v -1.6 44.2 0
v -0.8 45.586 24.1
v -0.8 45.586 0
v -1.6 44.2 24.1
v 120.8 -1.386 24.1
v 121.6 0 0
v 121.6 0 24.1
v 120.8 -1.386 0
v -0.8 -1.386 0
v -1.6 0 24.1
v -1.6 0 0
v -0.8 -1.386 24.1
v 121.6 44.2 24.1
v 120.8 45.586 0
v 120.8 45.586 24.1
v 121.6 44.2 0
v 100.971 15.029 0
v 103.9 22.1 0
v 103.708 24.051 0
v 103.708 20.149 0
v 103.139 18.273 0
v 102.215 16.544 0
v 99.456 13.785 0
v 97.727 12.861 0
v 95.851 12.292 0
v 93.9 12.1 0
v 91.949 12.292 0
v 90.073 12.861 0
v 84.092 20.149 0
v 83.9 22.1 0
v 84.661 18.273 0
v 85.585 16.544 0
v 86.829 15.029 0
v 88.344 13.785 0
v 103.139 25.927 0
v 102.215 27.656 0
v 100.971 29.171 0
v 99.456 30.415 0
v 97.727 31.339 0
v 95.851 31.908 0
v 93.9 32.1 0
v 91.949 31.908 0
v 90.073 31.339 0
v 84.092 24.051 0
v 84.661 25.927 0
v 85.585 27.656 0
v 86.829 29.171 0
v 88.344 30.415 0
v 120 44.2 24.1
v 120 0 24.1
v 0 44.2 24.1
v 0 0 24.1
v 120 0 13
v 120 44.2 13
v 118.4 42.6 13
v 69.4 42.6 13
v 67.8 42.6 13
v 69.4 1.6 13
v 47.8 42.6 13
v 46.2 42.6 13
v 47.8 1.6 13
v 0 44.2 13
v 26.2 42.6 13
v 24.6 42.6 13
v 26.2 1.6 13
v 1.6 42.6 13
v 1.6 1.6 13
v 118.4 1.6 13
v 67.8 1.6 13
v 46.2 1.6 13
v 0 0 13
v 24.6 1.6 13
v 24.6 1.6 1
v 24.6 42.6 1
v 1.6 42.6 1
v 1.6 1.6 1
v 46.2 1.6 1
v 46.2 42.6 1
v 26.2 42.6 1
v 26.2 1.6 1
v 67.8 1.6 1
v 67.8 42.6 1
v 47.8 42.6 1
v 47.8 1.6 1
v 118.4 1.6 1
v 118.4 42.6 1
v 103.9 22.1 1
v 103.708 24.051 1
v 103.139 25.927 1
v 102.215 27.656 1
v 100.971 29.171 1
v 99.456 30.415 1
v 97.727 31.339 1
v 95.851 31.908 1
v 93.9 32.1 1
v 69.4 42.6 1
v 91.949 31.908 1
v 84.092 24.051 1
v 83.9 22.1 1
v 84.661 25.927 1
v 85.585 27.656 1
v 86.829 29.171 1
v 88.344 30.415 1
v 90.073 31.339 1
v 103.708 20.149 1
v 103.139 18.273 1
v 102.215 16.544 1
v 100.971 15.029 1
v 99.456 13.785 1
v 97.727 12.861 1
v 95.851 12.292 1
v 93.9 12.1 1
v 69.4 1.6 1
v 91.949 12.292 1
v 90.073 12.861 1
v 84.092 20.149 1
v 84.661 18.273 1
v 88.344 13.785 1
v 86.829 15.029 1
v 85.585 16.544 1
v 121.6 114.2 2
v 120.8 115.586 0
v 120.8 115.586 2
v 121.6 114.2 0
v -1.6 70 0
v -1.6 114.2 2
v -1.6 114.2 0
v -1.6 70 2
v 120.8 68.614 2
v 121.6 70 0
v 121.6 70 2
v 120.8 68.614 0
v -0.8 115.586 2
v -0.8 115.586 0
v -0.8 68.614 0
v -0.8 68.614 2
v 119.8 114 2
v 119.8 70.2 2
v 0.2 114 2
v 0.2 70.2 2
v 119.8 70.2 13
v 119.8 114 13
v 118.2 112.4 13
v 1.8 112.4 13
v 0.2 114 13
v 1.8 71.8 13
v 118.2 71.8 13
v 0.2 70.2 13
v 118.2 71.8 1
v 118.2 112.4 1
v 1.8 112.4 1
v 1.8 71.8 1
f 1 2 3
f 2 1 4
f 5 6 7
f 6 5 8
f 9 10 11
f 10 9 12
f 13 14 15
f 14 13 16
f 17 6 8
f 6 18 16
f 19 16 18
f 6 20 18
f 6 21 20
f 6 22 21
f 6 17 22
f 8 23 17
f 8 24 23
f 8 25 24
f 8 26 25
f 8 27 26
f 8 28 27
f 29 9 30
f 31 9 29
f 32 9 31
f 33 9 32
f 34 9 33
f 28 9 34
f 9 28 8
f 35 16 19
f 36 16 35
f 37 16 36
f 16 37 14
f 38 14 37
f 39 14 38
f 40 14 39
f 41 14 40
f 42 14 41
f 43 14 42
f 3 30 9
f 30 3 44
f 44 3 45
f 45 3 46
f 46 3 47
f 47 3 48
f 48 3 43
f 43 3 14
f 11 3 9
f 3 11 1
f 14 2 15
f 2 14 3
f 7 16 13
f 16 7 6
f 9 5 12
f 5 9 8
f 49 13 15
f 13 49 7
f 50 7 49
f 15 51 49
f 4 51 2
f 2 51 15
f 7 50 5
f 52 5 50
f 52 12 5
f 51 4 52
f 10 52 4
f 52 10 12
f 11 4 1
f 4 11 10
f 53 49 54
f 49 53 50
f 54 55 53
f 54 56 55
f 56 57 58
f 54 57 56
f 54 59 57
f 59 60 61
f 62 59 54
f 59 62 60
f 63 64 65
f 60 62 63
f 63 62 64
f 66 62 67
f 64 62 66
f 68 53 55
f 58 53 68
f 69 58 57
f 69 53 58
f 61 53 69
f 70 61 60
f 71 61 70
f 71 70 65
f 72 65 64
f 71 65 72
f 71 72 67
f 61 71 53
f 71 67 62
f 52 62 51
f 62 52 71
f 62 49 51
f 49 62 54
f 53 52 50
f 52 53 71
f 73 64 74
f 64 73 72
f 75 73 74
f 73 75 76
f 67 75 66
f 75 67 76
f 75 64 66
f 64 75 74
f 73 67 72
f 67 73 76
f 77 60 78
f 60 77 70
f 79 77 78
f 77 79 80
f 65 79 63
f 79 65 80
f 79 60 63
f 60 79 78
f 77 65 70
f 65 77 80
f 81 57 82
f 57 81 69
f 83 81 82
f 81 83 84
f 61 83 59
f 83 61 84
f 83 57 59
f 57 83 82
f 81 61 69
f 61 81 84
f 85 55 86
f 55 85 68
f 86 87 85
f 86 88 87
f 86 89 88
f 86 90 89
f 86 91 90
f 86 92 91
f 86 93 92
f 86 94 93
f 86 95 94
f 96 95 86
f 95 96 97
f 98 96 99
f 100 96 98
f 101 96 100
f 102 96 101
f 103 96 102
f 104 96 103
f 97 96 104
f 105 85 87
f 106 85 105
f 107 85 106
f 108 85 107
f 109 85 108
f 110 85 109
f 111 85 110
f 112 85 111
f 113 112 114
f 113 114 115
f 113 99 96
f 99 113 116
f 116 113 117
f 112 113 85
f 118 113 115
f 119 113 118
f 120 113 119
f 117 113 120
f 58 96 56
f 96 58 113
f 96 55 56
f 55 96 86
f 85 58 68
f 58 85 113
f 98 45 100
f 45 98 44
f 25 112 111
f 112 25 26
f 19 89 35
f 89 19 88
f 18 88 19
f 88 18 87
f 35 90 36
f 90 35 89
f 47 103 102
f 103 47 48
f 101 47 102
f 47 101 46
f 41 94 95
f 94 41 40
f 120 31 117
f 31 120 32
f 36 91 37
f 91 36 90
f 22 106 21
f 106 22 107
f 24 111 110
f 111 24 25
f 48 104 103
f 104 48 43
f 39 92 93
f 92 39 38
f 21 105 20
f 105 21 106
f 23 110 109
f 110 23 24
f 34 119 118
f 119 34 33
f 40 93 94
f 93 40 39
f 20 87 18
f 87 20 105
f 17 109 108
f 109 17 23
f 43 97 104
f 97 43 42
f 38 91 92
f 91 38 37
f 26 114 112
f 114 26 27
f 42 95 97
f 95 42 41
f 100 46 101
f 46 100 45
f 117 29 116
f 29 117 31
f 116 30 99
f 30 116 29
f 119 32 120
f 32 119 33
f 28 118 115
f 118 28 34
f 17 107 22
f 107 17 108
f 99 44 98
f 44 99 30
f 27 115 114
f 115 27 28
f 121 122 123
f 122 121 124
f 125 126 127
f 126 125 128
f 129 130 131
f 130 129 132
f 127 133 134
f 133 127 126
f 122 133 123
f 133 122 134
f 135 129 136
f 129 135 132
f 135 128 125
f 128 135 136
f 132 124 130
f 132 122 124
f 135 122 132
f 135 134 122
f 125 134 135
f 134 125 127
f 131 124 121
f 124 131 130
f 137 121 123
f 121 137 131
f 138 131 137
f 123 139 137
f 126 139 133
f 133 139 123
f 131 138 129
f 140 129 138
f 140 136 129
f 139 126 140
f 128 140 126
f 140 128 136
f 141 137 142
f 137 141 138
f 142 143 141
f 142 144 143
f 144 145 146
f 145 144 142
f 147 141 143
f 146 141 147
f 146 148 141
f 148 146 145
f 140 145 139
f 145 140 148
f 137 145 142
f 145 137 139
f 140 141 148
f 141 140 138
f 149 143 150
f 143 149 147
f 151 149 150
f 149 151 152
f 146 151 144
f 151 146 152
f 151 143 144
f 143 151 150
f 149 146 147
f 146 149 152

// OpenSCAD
// Puerto Rico Anniversary Edition
//
// by W. Craig Trader is dual-licensed under 
// Creative Commons Attribution-ShareAlike 3.0 Unported License and
// GNU Lesser GPL 3.0 or later.

include <MCAD/units.scad>;

// Physical dimensions
WALL = 0.8 * mm; // Slicing filament thickness
GAP  = 0.2 * mm; // Size differential between box and lid, for snug fit
POKE_HOLE = 20 * mm; // Diameter of poke holes in bottom
BOTTOM = 1 * mm;

// Tile dimensions
BASIC_THICKNESS = 7/128 * inch;
DELUXE_THICKNESS = 1/8 * inch;
TILE_WIDTH = (1 + 37/64) * inch;
SMALL_TILE_HEIGHT = 29/32 * inch;
LARGE_TILE_HEIGHT = (1 + 57/64) * inch;

// Wall dimensions
OUTER  = 2 * WALL;
INNER  = 2 * WALL;
SEP    = 2 * WALL;

OVERLAP = 0.1 * mm; // Ensures that there are no vertical artifacts leftover

$fa=4;

module basic_bottom() {
    box_height = ceil( max( SMALL_TILE_HEIGHT/2, 5*BASIC_THICKNESS) );
    lid_height = ceil( SMALL_TILE_HEIGHT ) - box_height;

    s1 = ceil( 16*BASIC_THICKNESS );
    s2 = ceil( 14*BASIC_THICKNESS );
    s3 = ceil( 14*BASIC_THICKNESS );
    s4 = ceil( LARGE_TILE_HEIGHT );

    width = ceil( TILE_WIDTH );
    length = 2*INNER + 3*SEP + s1 + s2 + s3 + s4;
    height = 2*INNER + width;

    echo( Width=width, BasicS1=s1, BasicS2=s2, BasicS3=s3, BasicS4=s4 );
    echo( BasicInsideLength=length, BasicInsideHeight=height );
    echo( BasicOutsideLength=length+2*OUTER, BasicOutsideHeight=height+2*OUTER );

    difference() {
        // Outside of box
        minkowski() {
            cube( [ length, height, box_height+lid_height ] );
            cylinder( r=OUTER, h=OVERLAP );
        }
        
        // Remove upper lip
        translate( [ 0, 0, BOTTOM+box_height ] ) 
            cube( [ length, height, lid_height+OVERLAP ] );
        
        // Remove space for tiles
        translate( [ INNER, INNER, BOTTOM ] ) 
            cube( [ s1, width, box_height+OVERLAP ] );
        translate( [ INNER+s1+SEP, INNER, BOTTOM ] ) 
            cube( [ s2, width, box_height+OVERLAP ] );
        translate( [ INNER+s1+s2+2*SEP, INNER, BOTTOM ] ) 
            cube( [ s3, width, box_height+OVERLAP ] );
        translate( [ INNER+s1+s2+s3+3*SEP, INNER, BOTTOM ] ) 
            cube( [ s4, width, box_height+OVERLAP ] );

        // Remove holes in bottom, for ease in removing tiles and parts
        translate( [ INNER+s1+s2+s3+3*SEP+s4/2, INNER+width/2, -OVERLAP ] ) 
            cylinder( d=POKE_HOLE, h=BOTTOM+2*OVERLAP );
    }
}

module basic_top() {
    box_height = ceil( max( SMALL_TILE_HEIGHT/2, 5*BASIC_THICKNESS) );
    lid_height = ceil( SMALL_TILE_HEIGHT ) - box_height;

    s1 = ceil( 16*BASIC_THICKNESS );
    s2 = ceil( 14*BASIC_THICKNESS );
    s3 = ceil( 14*BASIC_THICKNESS );
    s4 = ceil( LARGE_TILE_HEIGHT );

    width = ceil( TILE_WIDTH );
    length = 2*INNER + 3*SEP + s1 + s2 + s3 + s4;
    height = 2*INNER + width;

    difference() {
        union() {
            minkowski() {
                cube( [ length, height, BOTTOM ] );
                cylinder( r=OUTER, h=BOTTOM );
            }
            translate( [ GAP, GAP, BOTTOM ] ) 
                cube( [ length-2*GAP, height-2*GAP, lid_height ] );
        }
        translate( [ INNER+GAP, INNER+GAP, BOTTOM ] ) 
            cube( [ length-2*INNER-2*GAP, height-2*INNER-2*GAP, lid_height+OVERLAP ] );
    }
}

module deluxe_bottom() {
    box_height = ceil( max( SMALL_TILE_HEIGHT/2, 5*DELUXE_THICKNESS) );
    lid_height = ceil( SMALL_TILE_HEIGHT ) - box_height;

    large = ceil( max( LARGE_TILE_HEIGHT, 16*DELUXE_THICKNESS ) );
    small = ceil( 14*DELUXE_THICKNESS );
    width = ceil( TILE_WIDTH );

    length = 2*INNER + large + SEP + small;
    height = 2*INNER + 2*width + SEP;

    echo( Width=width, DeluxeLarge=large, DeluxeSmall=small );
    echo( DeluxeInsideLength=length, DeluxeInsideHeight=height );
    echo( DeluxeOutsideLength=length+2*OUTER, DeluxeOutsideHeight=height+2*OUTER );

    difference() {
        // Outside of box
        minkowski() {
            cube( [ length, height, box_height+lid_height ] );
            cylinder( r=OUTER, h=OVERLAP );
        }
        
        // Remove upper lip
        translate( [ 0, 0, BOTTOM+box_height ] ) 
            cube( [ length, height, lid_height+OVERLAP ] );
        
        // Remove space for tiles
        translate( [ INNER, INNER, BOTTOM ] ) 
            cube( [ large, width, box_height+OVERLAP ] );
        translate( [ INNER, INNER+width+SEP, BOTTOM ] ) 
            cube( [ large, width, box_height+OVERLAP ] );
        translate( [ INNER+large+SEP, INNER, BOTTOM ] ) 
            cube( [ small, width, box_height+OVERLAP ] );
        translate( [ INNER+large+SEP, INNER+width+SEP, BOTTOM ] ) 
            cube( [ small, width, box_height+OVERLAP ] );
        
        // Remove holes in bottom, for ease in removing tiles and parts
        translate( [ INNER+large/2, INNER+width/2, -OVERLAP ] ) 
            cylinder( d=POKE_HOLE, h=BOTTOM+2*OVERLAP );
        translate( [ INNER+large/2, INNER+width+SEP+width/2, -OVERLAP ] ) 
            cylinder( d=POKE_HOLE, h=BOTTOM+2*OVERLAP );
        translate( [ INNER+large+SEP+small/2, INNER+width/2, -OVERLAP ] ) 
            cylinder( d=POKE_HOLE, h=BOTTOM+2*OVERLAP );
        translate( [ INNER+large+SEP+small/2, INNER+width+SEP+width/2, -OVERLAP ] ) 
            cylinder( d=POKE_HOLE, h=BOTTOM+2*OVERLAP );
    }
}

module deluxe_top() {
    box_height = ceil( max( SMALL_TILE_HEIGHT/2, 5*DELUXE_THICKNESS) );
    lid_height = ceil( SMALL_TILE_HEIGHT ) - box_height;

    large = ceil( max( LARGE_TILE_HEIGHT, 16*DELUXE_THICKNESS ) );
    small = ceil( 14*DELUXE_THICKNESS );
    width = ceil( TILE_WIDTH );

    length = 2*INNER + large + SEP + small;
    height = 2*INNER + 2*width + SEP;

    difference() {
        union() {
            minkowski() {
                cube( [ length, height, BOTTOM ] );
                cylinder( r=OUTER, h=BOTTOM );
            }
            translate( [ GAP, GAP, BOTTOM ] ) 
                cube( [ length-2*GAP, height-2*GAP, lid_height ] );
        }
        translate( [ INNER+GAP, INNER+GAP, BOTTOM ] ) 
            cube( [ length-2*INNER-2*GAP, height-2*INNER-2*GAP, lid_height+OVERLAP ] );
    }
}

if (1) {
    translate( [ 0,  0, 0 ] ) basic_bottom();
    translate( [ 0, 70, 0 ] ) basic_top();
}

if (0) {
    translate( [ 0,   0, 0 ] ) deluxe_bottom();
    translate( [ 0, 100, 0 ] ) deluxe_top();
}

if (0) {
    echo( DELUXE_THICKNESS=DELUXE_THICKNESS, BASIC_THICKNESS=BASIC_THICKNESS );
    echo( TILE_WIDTH=TILE_WIDTH, SMALL_TILE_HEIGHT=SMALL_TILE_HEIGHT, LARGE_TILE_HEIGHT=LARGE_TILE_HEIGHT );
    echo( LARGE=16*DELUXE_THICKNESS, SMALL=14*DELUXE_THICKNESS, WIDTH=TILE_WIDTH );
    echo( 5*DELUXE_THICKNESS, SMALL_TILE_HEIGHT-5*DELUXE_THICKNESS );
}
